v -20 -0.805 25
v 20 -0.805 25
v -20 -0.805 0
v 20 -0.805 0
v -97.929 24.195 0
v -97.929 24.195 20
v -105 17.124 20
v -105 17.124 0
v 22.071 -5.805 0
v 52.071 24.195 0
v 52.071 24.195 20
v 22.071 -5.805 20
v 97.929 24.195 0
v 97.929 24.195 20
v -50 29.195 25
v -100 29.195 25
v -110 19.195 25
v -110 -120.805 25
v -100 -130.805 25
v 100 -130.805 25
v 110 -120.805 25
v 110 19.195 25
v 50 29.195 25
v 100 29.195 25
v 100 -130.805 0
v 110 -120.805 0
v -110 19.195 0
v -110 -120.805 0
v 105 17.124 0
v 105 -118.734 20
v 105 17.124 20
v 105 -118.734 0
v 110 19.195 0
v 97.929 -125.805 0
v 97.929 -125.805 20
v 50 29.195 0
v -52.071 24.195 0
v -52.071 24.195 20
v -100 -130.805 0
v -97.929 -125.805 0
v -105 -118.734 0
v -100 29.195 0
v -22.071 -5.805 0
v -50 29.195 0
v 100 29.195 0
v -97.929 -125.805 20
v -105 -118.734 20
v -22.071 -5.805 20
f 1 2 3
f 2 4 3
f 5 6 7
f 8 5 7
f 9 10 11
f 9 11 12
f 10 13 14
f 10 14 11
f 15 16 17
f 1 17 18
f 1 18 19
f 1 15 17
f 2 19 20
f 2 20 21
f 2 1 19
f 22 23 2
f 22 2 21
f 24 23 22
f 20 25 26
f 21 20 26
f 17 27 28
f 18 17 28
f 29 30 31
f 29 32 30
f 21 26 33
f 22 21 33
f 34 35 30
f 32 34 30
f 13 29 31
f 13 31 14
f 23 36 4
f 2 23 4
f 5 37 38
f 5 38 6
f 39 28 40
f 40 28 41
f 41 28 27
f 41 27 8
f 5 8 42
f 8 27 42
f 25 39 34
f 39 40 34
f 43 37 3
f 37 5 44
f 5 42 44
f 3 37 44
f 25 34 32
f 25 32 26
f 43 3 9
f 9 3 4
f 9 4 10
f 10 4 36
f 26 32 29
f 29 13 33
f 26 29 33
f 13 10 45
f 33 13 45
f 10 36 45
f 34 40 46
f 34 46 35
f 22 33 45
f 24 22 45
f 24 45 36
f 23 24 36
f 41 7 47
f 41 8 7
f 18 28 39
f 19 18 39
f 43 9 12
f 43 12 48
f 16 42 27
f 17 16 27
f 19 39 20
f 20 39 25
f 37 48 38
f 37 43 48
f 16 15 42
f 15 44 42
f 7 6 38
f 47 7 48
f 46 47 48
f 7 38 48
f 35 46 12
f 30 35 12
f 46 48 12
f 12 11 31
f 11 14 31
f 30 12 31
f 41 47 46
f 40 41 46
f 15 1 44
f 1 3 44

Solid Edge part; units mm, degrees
sketch "Sketch1" plane through (0, 0, 0) normal (0, 0, 1) x (1, 0, 0)
  line L0 (-110, 19.1949) -> (-110, -120.8051)
  line L1 (-110, -120.8051) -> (-100, -130.8051)
  line L2 (-100, -130.8051) -> (100, -130.8051)
  line L3 (100, -130.8051) -> (110, -120.8051)
  line L4 (110, -120.8051) -> (110, 19.1949)
  line L5 (110, 19.1949) -> (100, 29.1949)
  line L6 (100, 29.1949) -> (50, 29.1949)
  line L7 (50, 29.1949) -> (20, -0.8051)
  line L8 (20, -0.8051) -> (-20, -0.8051)
  line L9 (-20, -0.8051) -> (-50, 29.1949)
  line L10 (-50, 29.1949) -> (-100, 29.1949)
  line L11 (-100, 29.1949) -> (-110, 19.1949)
  dimension "D1" = 10
  dimension "D2" = 160
  dimension "D3" = 220
  dimension "D4" = 100
  dimension "D5" = 30
extrude "Body_ThinWallOptions" add sketch "Sketch1" along normal blind 25
shell "Inside" thickness 5 removed faces 1 at (-75.5333, -102.5384, 0)
